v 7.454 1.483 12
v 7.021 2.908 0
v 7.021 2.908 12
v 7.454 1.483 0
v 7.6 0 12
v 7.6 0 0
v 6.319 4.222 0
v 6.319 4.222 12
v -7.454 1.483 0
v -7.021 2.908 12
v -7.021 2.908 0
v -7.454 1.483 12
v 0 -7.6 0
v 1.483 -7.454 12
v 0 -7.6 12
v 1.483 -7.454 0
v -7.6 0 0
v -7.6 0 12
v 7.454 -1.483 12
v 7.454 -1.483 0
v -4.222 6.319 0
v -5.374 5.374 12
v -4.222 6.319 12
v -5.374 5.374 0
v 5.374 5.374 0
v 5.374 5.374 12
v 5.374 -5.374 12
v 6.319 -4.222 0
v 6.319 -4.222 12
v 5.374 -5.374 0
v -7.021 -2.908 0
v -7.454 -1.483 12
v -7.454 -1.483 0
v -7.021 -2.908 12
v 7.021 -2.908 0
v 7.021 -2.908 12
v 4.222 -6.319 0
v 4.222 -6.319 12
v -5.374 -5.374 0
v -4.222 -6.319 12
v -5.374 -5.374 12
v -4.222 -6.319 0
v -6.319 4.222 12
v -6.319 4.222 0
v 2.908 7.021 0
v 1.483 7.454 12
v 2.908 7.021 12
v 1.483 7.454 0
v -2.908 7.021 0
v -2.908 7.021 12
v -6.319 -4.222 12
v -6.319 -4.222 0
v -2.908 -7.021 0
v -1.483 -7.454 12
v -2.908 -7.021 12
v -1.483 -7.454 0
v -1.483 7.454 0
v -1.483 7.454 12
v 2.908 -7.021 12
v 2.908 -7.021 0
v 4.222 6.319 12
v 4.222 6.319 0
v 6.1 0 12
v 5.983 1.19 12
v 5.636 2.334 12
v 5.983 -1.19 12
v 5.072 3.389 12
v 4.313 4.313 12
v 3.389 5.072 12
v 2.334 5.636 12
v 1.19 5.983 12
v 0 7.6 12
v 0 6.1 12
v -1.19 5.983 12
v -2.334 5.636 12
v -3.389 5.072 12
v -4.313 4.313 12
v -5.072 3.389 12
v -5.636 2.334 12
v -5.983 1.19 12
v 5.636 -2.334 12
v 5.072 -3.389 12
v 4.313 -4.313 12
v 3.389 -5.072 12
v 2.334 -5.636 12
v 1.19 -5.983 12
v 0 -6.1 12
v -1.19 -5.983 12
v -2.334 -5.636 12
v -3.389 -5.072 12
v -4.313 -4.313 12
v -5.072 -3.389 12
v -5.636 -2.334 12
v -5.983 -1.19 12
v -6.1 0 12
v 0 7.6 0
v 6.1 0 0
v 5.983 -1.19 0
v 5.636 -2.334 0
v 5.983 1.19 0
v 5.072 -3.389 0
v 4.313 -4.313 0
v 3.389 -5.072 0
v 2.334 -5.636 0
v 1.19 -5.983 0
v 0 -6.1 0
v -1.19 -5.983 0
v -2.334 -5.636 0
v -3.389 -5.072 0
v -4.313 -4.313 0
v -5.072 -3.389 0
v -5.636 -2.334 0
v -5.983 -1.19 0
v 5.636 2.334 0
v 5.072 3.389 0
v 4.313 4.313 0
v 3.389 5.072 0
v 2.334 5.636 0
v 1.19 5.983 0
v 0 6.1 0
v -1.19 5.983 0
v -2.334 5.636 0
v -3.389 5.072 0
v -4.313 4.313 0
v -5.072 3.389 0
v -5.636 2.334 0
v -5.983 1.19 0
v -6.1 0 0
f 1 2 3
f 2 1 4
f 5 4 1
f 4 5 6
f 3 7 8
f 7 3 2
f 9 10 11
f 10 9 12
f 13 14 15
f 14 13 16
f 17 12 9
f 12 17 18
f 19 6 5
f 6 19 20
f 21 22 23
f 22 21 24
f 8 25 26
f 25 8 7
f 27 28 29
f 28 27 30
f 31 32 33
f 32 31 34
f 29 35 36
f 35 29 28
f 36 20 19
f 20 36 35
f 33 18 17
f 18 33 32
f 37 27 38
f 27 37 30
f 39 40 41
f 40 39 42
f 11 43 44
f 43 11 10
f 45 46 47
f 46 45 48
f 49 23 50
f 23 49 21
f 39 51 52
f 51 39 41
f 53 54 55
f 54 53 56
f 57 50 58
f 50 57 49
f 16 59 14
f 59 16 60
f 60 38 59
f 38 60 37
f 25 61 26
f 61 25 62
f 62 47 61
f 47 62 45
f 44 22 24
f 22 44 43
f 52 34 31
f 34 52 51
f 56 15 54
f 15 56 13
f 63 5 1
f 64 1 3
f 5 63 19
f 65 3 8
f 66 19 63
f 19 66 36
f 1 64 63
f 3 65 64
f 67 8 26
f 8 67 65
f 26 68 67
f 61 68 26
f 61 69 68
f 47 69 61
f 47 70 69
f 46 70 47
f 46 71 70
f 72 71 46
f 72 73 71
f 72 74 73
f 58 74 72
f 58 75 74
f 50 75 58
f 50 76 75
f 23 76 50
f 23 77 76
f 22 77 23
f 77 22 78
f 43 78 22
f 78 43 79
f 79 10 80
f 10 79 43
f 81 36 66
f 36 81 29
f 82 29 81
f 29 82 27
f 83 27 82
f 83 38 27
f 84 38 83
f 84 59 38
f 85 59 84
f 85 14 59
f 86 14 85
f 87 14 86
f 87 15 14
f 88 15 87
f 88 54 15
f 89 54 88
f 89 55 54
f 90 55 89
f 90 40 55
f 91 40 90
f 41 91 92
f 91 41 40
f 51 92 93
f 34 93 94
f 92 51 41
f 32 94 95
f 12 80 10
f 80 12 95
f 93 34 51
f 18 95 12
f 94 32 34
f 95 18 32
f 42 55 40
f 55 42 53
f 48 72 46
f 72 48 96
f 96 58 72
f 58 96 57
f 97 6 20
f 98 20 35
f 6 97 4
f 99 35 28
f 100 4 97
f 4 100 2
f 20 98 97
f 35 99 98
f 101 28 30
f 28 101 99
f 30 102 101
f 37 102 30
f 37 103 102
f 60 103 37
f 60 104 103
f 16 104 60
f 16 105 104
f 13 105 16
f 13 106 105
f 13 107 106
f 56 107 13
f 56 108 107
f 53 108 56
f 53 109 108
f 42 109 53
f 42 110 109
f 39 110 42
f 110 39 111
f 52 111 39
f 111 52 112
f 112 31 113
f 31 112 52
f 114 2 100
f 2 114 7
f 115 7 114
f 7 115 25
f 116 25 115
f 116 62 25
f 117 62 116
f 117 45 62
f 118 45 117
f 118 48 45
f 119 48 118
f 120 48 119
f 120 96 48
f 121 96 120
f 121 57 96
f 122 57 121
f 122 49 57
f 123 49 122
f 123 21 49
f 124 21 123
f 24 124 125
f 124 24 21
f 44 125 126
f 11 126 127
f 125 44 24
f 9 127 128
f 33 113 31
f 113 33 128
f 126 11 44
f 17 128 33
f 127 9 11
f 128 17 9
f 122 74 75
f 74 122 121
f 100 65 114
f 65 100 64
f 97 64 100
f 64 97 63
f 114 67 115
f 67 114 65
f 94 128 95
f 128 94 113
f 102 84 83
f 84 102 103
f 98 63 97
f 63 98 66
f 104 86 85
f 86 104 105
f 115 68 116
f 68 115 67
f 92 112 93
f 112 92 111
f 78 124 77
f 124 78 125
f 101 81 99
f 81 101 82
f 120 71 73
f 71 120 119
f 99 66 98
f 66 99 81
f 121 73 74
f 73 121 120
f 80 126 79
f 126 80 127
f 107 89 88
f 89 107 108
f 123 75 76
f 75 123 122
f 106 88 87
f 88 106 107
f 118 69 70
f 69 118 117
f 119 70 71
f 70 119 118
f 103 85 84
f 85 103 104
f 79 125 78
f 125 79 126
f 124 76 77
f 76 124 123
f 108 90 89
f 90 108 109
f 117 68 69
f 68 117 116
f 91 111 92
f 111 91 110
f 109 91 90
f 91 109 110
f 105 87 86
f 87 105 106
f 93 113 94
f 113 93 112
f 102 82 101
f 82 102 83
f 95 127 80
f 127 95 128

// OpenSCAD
$fn = 32;

// ----------------------------------------------------------------------
// Spacer sleeve: 15.2 / 12.2 x 12 mm
// ----------------------------------------------------------------------

// --- parameters (mm) ---
sleeve_od = 15.2;         // outside diameter
sleeve_id = 12.2;         // shaft bore
sleeve_l = 12;            // sleeve length

module sleeve() {
  cylinder(h = sleeve_l, d = sleeve_od);
}

difference() {
  sleeve();
  translate([0, 0, -1]) cylinder(h = sleeve_l + 2, d = sleeve_id);
}
